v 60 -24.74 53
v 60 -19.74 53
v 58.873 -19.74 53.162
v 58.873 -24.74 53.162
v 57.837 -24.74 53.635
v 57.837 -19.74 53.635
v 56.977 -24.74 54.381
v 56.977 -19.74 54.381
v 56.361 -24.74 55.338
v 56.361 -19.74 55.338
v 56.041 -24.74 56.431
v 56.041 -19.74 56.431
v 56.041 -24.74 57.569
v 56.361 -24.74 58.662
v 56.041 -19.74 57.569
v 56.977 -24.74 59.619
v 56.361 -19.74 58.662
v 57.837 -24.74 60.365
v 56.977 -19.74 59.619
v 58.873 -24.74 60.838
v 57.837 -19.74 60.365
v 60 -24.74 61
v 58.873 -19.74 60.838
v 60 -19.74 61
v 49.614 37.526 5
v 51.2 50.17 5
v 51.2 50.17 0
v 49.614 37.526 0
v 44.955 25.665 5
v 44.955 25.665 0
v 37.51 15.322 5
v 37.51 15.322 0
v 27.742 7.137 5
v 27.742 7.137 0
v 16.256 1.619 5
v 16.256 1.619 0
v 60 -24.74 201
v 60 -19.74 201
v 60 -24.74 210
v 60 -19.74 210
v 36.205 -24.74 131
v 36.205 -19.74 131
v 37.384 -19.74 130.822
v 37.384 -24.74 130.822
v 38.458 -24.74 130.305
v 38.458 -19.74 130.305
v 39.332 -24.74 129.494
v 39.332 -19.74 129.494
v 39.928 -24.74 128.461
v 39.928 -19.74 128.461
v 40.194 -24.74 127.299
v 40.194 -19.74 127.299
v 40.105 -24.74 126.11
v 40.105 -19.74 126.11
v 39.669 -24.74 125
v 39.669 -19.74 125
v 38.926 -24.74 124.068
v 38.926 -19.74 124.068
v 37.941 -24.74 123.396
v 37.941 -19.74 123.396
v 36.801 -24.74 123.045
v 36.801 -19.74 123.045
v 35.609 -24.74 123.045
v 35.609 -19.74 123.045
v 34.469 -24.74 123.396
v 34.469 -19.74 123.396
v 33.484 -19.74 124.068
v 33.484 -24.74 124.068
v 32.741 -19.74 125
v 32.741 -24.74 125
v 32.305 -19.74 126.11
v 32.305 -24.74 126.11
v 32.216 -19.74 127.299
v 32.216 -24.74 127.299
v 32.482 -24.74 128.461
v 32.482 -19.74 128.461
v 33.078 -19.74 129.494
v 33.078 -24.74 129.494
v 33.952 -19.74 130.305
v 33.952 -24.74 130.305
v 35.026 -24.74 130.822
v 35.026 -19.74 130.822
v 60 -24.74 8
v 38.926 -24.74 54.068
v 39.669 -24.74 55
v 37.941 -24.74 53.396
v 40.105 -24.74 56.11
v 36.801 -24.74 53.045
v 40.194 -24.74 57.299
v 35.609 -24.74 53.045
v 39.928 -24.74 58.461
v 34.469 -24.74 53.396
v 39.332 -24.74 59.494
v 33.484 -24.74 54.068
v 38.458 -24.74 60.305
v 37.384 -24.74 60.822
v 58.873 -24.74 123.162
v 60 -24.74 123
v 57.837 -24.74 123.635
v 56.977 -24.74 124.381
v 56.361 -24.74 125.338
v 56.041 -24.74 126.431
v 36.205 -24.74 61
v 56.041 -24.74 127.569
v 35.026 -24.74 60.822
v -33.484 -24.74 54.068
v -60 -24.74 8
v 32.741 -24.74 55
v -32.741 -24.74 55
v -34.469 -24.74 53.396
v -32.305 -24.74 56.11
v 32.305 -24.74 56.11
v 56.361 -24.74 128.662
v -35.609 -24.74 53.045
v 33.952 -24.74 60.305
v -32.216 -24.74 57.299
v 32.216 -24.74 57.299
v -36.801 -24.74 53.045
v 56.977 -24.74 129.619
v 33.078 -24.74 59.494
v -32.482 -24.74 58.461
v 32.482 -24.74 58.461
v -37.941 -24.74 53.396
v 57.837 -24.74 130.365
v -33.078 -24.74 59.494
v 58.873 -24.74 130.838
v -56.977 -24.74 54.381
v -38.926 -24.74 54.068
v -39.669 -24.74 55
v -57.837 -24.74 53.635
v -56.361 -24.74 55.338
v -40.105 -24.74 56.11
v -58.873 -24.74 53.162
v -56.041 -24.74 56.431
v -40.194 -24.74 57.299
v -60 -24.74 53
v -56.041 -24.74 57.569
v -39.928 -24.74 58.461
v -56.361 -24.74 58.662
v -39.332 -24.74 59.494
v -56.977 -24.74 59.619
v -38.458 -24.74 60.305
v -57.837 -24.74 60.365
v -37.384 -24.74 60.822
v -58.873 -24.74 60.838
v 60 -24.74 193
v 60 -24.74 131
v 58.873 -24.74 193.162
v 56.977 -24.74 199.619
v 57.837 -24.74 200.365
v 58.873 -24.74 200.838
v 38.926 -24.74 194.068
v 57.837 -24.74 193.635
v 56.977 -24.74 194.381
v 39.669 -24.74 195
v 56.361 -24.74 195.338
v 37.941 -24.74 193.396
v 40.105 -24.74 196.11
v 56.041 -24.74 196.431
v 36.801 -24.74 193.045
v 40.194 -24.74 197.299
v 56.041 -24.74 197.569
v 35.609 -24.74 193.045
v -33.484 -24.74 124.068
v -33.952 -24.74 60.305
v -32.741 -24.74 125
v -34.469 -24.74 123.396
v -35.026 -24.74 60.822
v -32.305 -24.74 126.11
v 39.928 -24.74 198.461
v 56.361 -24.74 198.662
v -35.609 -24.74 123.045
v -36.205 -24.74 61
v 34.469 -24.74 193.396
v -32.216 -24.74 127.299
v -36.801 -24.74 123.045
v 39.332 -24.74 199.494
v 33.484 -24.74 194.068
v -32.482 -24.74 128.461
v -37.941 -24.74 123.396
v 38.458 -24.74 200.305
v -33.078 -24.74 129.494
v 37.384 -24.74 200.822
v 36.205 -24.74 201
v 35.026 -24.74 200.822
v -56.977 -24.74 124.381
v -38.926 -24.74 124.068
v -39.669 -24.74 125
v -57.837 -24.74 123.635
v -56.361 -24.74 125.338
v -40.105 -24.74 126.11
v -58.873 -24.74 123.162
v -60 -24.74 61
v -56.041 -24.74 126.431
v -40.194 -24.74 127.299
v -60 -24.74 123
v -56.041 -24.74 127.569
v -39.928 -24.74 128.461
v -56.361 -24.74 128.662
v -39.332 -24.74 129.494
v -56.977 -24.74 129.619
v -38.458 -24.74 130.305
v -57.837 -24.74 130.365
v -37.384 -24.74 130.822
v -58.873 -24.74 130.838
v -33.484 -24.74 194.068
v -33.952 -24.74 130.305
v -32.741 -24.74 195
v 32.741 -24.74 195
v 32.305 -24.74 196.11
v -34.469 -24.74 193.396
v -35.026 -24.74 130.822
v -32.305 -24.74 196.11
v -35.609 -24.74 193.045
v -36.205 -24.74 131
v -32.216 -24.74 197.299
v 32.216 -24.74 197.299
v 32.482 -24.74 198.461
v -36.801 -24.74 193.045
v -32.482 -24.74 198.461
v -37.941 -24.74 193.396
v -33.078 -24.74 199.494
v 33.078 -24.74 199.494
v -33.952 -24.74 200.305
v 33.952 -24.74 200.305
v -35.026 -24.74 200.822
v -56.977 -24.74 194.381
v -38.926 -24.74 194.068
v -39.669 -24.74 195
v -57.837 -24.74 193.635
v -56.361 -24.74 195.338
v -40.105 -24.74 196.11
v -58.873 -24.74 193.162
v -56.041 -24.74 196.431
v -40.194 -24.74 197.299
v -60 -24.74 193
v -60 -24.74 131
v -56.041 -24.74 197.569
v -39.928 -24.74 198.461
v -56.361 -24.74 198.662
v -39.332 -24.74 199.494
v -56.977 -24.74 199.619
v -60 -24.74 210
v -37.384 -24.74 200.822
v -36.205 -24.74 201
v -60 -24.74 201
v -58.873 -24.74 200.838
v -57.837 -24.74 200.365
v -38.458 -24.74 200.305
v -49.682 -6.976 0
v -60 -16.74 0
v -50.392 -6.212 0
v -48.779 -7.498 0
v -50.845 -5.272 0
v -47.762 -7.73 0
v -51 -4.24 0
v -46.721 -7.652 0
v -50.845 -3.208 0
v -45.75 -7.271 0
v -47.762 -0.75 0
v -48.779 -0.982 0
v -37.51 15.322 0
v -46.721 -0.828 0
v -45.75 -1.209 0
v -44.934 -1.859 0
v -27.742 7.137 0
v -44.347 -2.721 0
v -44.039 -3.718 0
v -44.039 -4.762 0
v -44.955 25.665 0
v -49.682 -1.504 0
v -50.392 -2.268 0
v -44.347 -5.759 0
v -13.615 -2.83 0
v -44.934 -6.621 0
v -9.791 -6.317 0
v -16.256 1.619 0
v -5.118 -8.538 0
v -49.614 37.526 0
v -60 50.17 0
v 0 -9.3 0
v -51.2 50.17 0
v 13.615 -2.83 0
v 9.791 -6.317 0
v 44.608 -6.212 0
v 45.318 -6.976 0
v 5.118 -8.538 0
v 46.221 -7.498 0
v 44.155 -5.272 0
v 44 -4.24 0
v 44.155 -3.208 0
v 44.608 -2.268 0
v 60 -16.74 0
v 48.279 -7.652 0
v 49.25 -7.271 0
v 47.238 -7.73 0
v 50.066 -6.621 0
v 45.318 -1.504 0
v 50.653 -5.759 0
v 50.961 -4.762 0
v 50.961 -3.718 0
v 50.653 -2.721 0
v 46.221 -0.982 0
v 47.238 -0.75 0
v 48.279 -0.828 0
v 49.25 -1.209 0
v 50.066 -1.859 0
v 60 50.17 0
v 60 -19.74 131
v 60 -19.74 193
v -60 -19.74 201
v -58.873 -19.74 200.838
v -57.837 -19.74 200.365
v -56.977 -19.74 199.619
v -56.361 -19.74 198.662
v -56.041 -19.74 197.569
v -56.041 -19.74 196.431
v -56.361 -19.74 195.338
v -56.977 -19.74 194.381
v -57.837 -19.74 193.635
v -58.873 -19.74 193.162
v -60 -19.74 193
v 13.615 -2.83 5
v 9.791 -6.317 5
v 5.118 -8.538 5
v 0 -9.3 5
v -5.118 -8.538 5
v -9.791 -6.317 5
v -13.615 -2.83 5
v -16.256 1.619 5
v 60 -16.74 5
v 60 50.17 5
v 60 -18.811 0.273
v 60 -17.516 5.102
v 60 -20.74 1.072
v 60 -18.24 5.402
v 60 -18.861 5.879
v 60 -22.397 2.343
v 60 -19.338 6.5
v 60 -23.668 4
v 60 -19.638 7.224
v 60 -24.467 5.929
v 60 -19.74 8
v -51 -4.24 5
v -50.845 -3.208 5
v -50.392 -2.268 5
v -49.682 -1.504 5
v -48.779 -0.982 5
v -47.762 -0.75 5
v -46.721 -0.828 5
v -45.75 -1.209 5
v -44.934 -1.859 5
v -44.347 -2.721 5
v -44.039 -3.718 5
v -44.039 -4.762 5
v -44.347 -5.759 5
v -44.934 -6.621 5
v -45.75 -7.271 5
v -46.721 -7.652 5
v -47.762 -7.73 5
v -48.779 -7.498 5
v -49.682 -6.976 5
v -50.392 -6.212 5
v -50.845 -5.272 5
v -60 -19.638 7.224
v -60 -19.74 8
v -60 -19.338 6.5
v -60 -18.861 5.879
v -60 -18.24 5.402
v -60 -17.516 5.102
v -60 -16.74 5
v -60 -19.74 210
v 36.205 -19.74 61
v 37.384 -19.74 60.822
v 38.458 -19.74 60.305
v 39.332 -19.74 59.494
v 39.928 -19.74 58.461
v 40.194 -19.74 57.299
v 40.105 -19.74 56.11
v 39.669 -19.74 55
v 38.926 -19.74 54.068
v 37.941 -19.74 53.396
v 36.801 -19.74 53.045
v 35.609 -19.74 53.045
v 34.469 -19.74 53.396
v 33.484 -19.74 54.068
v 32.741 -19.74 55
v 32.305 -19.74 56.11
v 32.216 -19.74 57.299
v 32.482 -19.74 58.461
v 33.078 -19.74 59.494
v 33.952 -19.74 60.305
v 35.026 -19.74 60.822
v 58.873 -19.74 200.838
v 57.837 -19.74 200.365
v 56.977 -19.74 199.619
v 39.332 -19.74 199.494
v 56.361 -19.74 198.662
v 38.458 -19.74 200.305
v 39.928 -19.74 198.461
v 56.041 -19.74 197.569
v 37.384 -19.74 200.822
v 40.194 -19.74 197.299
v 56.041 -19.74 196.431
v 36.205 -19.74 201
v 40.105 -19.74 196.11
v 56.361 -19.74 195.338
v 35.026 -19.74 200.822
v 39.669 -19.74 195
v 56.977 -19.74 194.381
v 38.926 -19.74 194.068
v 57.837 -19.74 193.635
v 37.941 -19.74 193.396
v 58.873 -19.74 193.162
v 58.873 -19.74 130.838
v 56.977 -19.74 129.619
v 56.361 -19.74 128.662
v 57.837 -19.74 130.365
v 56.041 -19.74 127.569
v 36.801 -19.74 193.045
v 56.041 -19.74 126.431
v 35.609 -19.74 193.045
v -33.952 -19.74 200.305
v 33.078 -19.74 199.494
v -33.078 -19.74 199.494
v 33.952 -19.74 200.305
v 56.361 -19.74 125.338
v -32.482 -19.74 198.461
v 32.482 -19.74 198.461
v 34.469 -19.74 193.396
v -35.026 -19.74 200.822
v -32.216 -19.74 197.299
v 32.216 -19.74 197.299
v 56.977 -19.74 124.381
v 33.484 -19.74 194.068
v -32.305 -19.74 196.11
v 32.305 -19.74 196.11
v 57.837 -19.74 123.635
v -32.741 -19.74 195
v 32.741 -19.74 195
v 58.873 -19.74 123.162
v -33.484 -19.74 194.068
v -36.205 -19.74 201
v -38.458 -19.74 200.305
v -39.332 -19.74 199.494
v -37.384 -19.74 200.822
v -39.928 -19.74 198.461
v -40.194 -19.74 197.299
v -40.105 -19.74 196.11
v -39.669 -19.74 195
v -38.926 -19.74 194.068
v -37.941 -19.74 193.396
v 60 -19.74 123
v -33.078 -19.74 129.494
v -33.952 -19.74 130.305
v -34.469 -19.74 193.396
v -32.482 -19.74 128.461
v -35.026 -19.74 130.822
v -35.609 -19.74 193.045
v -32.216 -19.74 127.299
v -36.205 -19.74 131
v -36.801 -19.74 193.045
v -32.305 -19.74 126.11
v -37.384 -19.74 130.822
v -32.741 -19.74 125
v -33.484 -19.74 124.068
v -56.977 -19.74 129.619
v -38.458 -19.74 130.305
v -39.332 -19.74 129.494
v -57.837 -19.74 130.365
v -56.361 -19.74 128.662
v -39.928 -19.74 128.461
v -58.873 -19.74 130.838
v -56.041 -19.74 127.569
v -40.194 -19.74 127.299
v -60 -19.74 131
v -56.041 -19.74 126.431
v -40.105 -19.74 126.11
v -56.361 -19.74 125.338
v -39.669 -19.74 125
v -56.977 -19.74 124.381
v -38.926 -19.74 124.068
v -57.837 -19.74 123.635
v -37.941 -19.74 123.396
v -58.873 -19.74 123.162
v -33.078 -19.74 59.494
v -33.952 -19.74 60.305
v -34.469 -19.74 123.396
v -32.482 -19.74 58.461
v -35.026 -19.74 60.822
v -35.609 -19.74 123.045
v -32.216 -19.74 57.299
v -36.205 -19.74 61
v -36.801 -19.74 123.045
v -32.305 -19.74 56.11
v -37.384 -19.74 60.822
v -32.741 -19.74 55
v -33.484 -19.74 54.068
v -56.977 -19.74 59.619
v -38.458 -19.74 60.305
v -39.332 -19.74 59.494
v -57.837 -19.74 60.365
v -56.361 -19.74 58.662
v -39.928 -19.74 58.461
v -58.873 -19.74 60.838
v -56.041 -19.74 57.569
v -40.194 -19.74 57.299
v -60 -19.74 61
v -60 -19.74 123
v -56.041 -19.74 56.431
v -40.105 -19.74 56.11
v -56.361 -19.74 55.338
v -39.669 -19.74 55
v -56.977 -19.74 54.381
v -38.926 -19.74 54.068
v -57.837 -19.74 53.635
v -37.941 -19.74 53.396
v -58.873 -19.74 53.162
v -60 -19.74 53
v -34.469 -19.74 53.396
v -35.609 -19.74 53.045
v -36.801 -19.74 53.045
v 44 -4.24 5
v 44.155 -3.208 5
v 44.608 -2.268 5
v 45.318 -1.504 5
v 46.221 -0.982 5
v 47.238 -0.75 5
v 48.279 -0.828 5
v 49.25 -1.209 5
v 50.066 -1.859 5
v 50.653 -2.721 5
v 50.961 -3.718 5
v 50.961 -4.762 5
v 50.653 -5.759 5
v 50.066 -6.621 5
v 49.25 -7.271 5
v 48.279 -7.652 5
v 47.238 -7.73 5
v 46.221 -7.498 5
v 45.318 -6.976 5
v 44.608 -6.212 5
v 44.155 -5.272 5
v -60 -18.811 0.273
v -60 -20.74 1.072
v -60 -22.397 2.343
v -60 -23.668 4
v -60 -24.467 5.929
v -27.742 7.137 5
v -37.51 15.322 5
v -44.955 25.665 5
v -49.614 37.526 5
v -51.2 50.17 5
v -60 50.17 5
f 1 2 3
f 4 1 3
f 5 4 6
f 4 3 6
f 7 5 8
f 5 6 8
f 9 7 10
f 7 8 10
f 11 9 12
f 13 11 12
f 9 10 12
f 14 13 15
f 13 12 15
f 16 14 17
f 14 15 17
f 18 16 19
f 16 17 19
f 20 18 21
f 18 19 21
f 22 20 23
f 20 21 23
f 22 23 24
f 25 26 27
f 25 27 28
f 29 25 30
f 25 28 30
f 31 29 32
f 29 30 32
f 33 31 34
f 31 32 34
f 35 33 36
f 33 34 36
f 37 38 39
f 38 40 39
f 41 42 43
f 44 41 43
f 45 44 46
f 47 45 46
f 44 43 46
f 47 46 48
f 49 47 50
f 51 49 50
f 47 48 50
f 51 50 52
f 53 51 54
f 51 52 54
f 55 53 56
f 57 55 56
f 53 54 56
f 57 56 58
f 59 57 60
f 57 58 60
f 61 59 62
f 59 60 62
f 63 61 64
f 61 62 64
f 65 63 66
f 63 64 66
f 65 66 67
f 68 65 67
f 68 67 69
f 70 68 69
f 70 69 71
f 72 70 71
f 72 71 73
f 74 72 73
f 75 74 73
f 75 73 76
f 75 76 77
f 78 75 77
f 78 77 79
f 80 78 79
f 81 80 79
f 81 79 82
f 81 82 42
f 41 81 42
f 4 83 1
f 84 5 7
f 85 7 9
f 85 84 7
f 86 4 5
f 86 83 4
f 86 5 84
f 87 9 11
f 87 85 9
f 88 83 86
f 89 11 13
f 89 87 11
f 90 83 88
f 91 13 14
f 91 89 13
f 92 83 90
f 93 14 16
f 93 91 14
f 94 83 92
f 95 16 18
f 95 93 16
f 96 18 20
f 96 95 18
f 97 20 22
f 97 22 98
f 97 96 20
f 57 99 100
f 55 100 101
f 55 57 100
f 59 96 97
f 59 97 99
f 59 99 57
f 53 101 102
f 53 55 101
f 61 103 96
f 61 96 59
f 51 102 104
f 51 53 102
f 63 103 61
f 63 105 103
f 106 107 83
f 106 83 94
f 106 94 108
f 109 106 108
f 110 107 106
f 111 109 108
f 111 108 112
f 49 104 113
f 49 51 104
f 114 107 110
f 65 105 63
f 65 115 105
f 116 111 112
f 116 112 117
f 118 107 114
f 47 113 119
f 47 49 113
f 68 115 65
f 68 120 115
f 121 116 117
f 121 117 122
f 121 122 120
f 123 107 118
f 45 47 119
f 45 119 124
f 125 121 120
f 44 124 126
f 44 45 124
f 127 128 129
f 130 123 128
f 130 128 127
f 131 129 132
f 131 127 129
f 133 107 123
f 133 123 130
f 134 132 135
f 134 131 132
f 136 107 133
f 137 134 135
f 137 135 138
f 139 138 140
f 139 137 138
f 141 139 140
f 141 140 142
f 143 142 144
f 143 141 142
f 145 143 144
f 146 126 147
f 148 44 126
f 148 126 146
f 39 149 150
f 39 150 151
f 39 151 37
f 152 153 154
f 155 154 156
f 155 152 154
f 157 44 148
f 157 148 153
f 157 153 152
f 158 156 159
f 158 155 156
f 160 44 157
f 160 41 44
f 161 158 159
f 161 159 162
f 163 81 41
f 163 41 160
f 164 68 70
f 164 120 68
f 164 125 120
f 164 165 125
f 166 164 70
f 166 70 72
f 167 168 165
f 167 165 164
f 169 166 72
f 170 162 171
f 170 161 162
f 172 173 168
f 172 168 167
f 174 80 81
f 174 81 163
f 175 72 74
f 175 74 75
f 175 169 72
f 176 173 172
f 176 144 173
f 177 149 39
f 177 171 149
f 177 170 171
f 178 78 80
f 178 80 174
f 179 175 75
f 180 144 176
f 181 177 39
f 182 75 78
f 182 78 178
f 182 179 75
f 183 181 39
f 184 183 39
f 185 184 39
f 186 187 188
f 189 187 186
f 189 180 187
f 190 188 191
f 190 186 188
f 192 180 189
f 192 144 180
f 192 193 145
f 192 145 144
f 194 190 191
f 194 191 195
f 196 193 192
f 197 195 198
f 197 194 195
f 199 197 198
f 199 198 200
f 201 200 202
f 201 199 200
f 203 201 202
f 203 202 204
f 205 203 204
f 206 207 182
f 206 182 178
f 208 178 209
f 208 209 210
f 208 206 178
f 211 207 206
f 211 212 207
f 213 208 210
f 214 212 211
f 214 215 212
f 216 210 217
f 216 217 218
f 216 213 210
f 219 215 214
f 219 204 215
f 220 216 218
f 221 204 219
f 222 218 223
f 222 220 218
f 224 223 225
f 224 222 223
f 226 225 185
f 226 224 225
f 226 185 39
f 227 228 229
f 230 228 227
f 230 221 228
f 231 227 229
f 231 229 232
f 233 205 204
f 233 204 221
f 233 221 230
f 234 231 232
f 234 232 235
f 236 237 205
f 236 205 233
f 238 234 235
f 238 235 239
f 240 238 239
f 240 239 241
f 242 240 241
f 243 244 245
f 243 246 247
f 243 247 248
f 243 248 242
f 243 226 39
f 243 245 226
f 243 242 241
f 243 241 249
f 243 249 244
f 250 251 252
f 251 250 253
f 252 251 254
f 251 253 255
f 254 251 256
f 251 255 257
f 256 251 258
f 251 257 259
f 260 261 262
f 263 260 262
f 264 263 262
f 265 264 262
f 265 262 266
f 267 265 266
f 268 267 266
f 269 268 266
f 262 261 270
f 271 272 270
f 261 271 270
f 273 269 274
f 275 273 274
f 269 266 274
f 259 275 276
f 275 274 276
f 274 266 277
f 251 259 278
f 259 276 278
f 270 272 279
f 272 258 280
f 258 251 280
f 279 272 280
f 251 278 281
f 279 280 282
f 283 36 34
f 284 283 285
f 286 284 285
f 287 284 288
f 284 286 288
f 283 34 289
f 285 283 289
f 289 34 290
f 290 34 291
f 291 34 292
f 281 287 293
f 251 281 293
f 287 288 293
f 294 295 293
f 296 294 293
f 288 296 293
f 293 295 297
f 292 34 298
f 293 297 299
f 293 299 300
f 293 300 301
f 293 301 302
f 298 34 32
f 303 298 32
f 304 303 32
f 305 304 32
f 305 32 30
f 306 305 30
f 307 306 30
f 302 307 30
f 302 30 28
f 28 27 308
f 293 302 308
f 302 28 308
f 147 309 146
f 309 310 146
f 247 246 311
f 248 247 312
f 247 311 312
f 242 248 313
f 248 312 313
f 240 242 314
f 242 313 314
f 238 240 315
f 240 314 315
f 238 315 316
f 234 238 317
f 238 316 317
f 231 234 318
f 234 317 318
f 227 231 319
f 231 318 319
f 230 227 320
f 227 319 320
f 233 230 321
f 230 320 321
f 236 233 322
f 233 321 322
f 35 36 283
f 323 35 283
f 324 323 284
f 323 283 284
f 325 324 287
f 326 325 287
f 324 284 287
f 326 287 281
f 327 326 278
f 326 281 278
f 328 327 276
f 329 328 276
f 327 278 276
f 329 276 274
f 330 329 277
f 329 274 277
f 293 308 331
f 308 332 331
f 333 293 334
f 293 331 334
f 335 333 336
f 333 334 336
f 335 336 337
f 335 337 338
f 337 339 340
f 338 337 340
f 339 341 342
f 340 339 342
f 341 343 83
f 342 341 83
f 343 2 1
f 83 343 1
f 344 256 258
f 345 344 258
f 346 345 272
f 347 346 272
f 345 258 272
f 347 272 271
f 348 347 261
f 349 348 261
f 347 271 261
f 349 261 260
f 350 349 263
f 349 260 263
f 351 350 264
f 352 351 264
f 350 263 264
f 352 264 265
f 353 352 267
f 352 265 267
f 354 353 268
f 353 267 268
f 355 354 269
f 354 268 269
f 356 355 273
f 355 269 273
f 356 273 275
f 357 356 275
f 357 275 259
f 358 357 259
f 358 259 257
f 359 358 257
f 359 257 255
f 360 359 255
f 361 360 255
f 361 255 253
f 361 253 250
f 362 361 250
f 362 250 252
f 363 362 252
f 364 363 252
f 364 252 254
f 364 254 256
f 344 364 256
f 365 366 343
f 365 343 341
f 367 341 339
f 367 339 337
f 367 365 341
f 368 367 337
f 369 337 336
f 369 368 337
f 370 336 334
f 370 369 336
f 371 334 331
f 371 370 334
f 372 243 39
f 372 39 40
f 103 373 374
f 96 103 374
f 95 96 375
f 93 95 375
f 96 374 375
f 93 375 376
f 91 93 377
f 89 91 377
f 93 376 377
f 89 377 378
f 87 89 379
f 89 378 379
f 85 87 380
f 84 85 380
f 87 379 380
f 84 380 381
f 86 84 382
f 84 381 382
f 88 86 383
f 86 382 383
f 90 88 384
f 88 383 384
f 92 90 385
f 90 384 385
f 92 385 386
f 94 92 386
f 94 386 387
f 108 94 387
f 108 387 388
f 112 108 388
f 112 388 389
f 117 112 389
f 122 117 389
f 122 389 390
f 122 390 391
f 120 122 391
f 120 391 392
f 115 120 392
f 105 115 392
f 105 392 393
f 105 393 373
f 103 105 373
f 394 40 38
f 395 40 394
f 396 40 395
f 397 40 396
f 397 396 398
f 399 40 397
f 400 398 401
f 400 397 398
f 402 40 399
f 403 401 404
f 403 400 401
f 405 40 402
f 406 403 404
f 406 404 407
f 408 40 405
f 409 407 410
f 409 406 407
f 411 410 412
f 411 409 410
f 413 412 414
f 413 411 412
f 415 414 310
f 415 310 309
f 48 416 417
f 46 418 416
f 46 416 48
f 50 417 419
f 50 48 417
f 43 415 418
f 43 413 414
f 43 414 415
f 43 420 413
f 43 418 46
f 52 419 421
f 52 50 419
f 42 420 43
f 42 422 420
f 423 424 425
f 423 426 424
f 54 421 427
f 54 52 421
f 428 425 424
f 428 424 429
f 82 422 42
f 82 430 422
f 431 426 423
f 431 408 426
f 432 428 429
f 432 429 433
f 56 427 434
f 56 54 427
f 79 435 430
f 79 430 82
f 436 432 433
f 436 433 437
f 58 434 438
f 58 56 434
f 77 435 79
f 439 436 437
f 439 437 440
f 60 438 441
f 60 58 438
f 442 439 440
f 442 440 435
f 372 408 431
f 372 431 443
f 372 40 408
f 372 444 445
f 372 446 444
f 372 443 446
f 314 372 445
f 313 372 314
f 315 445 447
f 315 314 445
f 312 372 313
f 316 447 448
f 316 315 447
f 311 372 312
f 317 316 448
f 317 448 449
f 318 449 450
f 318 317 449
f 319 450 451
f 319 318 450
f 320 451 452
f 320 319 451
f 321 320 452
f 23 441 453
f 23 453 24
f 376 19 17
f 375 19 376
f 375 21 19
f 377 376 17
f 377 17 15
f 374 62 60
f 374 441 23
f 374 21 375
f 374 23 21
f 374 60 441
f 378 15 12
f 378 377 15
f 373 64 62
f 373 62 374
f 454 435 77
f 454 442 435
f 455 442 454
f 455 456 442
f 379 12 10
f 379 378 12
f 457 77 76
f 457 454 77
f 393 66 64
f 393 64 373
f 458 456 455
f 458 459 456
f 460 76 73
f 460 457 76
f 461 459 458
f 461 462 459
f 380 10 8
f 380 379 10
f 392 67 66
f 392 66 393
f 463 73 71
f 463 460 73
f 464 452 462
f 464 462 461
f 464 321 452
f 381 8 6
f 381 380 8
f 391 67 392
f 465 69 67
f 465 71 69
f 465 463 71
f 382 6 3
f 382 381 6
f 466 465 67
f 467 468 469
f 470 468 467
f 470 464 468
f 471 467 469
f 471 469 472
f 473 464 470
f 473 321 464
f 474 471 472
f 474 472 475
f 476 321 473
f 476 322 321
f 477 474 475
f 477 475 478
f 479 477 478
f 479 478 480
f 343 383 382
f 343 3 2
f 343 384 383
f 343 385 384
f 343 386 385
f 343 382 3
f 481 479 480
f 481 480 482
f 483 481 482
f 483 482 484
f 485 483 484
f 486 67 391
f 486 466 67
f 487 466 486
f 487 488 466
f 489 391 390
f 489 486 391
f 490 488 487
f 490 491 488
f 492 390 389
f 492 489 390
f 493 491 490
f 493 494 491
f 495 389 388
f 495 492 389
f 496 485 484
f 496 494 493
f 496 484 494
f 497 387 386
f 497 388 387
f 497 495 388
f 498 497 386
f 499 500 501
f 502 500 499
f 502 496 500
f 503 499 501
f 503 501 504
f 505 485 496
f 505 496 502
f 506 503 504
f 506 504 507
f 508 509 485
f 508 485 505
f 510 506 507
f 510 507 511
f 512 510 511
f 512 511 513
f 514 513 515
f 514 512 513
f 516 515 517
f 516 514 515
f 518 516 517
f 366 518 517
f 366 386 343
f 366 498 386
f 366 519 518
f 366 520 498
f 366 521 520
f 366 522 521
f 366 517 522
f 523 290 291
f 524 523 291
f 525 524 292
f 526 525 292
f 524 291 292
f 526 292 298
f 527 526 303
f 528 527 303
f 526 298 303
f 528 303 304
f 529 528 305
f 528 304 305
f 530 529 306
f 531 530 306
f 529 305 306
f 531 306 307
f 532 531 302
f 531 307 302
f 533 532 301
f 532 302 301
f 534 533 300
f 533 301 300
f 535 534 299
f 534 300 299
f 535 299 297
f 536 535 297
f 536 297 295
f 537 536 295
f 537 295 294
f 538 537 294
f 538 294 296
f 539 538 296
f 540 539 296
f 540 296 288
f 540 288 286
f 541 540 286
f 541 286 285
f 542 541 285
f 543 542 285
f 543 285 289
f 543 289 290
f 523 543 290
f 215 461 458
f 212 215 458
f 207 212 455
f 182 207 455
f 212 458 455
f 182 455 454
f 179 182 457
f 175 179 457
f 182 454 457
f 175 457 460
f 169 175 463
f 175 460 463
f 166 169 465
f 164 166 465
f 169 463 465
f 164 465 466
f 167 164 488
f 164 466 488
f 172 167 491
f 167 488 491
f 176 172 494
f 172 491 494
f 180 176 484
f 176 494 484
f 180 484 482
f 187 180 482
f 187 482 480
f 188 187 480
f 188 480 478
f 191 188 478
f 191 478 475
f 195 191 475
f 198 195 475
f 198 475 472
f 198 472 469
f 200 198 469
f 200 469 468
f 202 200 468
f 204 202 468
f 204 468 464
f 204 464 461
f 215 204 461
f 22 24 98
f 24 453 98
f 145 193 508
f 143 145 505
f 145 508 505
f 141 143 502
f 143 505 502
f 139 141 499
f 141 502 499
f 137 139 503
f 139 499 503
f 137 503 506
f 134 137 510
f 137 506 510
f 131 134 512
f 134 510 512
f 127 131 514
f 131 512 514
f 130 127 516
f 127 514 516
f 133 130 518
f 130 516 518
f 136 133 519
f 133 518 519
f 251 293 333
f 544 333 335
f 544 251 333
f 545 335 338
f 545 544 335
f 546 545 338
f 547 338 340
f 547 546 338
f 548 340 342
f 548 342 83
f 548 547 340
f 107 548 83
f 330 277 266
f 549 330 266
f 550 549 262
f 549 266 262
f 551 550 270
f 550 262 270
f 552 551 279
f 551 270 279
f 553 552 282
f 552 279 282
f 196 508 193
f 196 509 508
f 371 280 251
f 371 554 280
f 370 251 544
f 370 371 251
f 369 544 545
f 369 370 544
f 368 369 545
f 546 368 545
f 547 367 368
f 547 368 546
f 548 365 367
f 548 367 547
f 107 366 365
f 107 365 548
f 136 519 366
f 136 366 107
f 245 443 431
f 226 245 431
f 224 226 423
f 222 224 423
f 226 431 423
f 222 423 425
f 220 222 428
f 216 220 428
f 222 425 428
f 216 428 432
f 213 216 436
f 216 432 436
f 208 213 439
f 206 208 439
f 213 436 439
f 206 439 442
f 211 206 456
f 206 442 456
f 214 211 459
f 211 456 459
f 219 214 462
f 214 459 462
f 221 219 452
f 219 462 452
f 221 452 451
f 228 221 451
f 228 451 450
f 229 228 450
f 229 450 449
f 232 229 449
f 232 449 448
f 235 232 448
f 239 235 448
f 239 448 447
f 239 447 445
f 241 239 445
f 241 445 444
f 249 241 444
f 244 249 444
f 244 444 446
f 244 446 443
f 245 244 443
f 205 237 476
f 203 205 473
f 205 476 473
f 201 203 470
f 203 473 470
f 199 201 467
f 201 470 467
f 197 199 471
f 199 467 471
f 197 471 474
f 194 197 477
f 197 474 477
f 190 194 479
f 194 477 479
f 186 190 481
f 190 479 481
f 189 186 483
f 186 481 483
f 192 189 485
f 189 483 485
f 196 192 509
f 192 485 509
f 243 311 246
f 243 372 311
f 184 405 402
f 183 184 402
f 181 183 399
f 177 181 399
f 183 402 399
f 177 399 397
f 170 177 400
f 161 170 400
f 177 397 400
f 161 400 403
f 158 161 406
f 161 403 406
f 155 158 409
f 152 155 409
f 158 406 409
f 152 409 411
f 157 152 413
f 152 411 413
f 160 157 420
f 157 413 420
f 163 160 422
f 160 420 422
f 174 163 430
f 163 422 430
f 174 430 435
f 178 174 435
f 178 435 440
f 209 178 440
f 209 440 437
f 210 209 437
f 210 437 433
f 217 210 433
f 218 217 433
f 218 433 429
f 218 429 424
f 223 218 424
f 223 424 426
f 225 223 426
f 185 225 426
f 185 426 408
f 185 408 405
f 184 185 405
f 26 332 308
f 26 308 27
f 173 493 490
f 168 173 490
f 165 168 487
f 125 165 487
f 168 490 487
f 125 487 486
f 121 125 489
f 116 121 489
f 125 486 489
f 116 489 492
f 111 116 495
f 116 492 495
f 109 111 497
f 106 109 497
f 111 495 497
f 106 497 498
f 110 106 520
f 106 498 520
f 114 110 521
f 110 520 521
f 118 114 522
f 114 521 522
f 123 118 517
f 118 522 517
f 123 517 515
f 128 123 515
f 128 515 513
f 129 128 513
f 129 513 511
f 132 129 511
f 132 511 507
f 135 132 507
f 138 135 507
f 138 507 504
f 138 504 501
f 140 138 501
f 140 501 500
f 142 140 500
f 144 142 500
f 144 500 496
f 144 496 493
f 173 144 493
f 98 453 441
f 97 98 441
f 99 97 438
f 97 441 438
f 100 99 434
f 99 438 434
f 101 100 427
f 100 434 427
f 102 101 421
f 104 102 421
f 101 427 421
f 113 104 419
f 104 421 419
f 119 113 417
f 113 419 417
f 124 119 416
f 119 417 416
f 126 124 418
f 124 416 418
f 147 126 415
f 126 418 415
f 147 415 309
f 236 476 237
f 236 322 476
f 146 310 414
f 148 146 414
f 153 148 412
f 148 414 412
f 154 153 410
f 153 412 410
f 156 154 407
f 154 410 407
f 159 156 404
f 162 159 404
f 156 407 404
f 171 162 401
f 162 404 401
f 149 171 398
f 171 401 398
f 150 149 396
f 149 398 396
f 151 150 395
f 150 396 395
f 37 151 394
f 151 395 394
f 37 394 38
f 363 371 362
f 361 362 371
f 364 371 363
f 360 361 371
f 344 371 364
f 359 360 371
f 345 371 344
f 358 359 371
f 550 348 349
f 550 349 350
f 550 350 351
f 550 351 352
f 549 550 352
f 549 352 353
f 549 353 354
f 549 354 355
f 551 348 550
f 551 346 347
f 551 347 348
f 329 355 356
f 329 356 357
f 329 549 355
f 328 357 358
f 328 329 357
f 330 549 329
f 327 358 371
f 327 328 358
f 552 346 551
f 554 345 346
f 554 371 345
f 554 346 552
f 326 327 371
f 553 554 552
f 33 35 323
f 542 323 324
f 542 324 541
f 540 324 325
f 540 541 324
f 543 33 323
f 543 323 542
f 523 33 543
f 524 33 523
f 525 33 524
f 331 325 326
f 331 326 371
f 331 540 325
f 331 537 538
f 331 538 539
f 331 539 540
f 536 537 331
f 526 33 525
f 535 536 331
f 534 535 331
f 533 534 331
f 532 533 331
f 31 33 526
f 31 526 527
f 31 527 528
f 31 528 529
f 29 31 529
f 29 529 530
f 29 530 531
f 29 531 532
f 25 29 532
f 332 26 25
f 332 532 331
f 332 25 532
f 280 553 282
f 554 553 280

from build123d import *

# Parameters (mm, degrees)
BASE_FLANGE2_DEPTH           = 5
EDGE_FLANGE3_STRIP_W         = 26
EDGE_FLANGE3_STRIP_H         = 5
EDGE_FLANGE3_STRIP_CUT_DEPTH = 120
EDGE_FLANGE3_DEPTH           = 120
SKETCH18_R                   = 3
CUT_EXTRUDE7_DEPTH           = 10
SKETCH22_R                   = 4
CUT_EXTRUDE11_DEPTH          = 10
SKETCH25_R                   = 3.5
CUT_EXTRUDE14_DEPTH          = 10
CUT_EXTRUDE17_DEPTH          = 243.986110714
CUT_EXTRUDE17_DEPTH_BACK     = 243.986110714
SKETCH26_R                   = 3


# Sheet-metal steps are written as plain solids
with BuildPart() as part:
    # Sketch1 → Base-Flange2 (new body)
    with BuildSketch(Plane.XY):
        with BuildLine():
            Line((60, -19.74), (60, 100.5))
            ThreePointArc((60, 100.5), (58.242640687, 104.742640687), (54, 106.5))
            Line((54, 106.5), (-54, 106.5))
            ThreePointArc((-54, 106.5), (-58.242640687, 104.742640687), (-60, 100.5))
            Line((-60, 100.5), (-60, -19.74))
            Line((-60, -19.74), (60, -19.74))
        make_face()
    extrude(amount=BASE_FLANGE2_DEPTH)

    # Edge-Flange3 strip (across the edge) → Edge-Flange3 strip cut (cut)
    with BuildSketch(Plane(origin=(-60, -19.74, 5), x_dir=(0, 1, 0), z_dir=(1, 0, 0))):
        with Locations((-10, -2.5)):
            Rectangle(EDGE_FLANGE3_STRIP_W, EDGE_FLANGE3_STRIP_H)
    extrude(amount=EDGE_FLANGE3_STRIP_CUT_DEPTH, mode=Mode.SUBTRACT)

    # Edge-Flange3 section (across the edge) → Edge-Flange3 (add)
    with BuildSketch(Plane(origin=(-60, -19.74, 5), x_dir=(0, 1, 0), z_dir=(1, 0, 0))):
        with BuildLine():
            Line((-5, 3), (-5, 205))
            Line((-5, 205), (0, 205))
            Line((0, 205), (0, 3))
            ThreePointArc((0, 3), (0.878679656, 0.878679656), (3, 0))
            Line((3, 0), (3, -5))
            ThreePointArc((3, -5), (-2.656854249, -2.656854249), (-5, 3))
        make_face()
    extrude(amount=EDGE_FLANGE3_DEPTH)

    # Sketch18 → Cut-Extrude7 (cut)
    with BuildSketch(Plane.XY.offset(5)):
        with Locations((-50, 96.5)):
            Circle(SKETCH18_R)
        with Locations((50, 96.5)):
            Circle(SKETCH18_R)
    extrude(amount=-CUT_EXTRUDE7_DEPTH, mode=Mode.SUBTRACT)

    # Sketch22 → Cut-Extrude11 (cut)
    with BuildSketch(Plane(origin=(0, -19.74, 0), x_dir=(1, 0, 0), z_dir=(0, 1, 0))):
        with Locations(Location((36.205, -197, 0), (0, 0, 270))):
            Circle(SKETCH22_R)
        with Locations(Location((-36.205, -197, 0), (0, 0, 270))):
            Circle(SKETCH22_R)
        with Locations(Location((-36.205, -127, 0), (0, 0, 270))):
            Circle(SKETCH22_R)
        with Locations(Location((36.205, -127, 0), (0, 0, 270))):
            Circle(SKETCH22_R)
        with Locations(Location((36.205, -57, 0), (0, 0, 270))):
            Circle(SKETCH22_R)
        with Locations(Location((-36.205, -57, 0), (0, 0, 270))):
            Circle(SKETCH22_R)
        with Locations((60, -197)):
            Circle(SKETCH22_R)
        with Locations((60, -127)):
            Circle(SKETCH22_R)
        with Locations((-60, -197)):
            Circle(SKETCH22_R)
        with Locations((-60, -127)):
            Circle(SKETCH22_R)
        with Locations((-60, -57)):
            Circle(SKETCH22_R)
        with Locations((60, -57)):
            Circle(SKETCH22_R)
    extrude(amount=-CUT_EXTRUDE11_DEPTH, mode=Mode.SUBTRACT)

    # Sketch25 → Cut-Extrude14 (cut)
    with BuildSketch(Plane(origin=(0, 0, 0), x_dir=(-1, 0, 0), z_dir=(0, 0, -1))):
        with Locations((-47.5, -4.24)):
            Circle(SKETCH25_R)
        with Locations((47.5, -4.24)):
            Circle(SKETCH25_R)
        with BuildLine():
            ThreePointArc((16.25584062, 1.619123121), (0, 101.37), (-16.25584062, 1.619123121))
            ThreePointArc((-16.25584062, 1.619123121), (0, -9.3), (16.25584062, 1.619123121))
        make_face()
    extrude(amount=-CUT_EXTRUDE14_DEPTH, mode=Mode.SUBTRACT)

    # Sketch26 → Cut-Extrude17 (cut, two sides: drawn at the far end of the back side and taken through both)
    with BuildSketch(Plane(origin=(0, 0, 0), x_dir=(-1, 0, 0), z_dir=(0, 0, -1)).offset(-CUT_EXTRUDE17_DEPTH_BACK)):
        with BuildLine():
            Line((-60, 50.17), (-51.2, 50.17))
            ThreePointArc((-51.2, 50.17), (0, 101.37), (51.2, 50.17))
            Line((51.2, 50.17), (60, 50.17))
            Line((60, 50.17), (60, 100.5))
            ThreePointArc((60, 100.5), (58.242640687, 104.742640687), (54, 106.5))
            Line((54, 106.5), (-54, 106.5))
            ThreePointArc((-54, 106.5), (-58.242640687, 104.742640687), (-60, 100.5))
            Line((-60, 100.5), (-60, 50.17))
        make_face()
        with Locations((-50, 96.5)):
            Circle(SKETCH26_R, mode=Mode.SUBTRACT)
        with Locations((50, 96.5)):
            Circle(SKETCH26_R, mode=Mode.SUBTRACT)
    extrude(amount=CUT_EXTRUDE17_DEPTH + CUT_EXTRUDE17_DEPTH_BACK, mode=Mode.SUBTRACT)


solid = part.part
